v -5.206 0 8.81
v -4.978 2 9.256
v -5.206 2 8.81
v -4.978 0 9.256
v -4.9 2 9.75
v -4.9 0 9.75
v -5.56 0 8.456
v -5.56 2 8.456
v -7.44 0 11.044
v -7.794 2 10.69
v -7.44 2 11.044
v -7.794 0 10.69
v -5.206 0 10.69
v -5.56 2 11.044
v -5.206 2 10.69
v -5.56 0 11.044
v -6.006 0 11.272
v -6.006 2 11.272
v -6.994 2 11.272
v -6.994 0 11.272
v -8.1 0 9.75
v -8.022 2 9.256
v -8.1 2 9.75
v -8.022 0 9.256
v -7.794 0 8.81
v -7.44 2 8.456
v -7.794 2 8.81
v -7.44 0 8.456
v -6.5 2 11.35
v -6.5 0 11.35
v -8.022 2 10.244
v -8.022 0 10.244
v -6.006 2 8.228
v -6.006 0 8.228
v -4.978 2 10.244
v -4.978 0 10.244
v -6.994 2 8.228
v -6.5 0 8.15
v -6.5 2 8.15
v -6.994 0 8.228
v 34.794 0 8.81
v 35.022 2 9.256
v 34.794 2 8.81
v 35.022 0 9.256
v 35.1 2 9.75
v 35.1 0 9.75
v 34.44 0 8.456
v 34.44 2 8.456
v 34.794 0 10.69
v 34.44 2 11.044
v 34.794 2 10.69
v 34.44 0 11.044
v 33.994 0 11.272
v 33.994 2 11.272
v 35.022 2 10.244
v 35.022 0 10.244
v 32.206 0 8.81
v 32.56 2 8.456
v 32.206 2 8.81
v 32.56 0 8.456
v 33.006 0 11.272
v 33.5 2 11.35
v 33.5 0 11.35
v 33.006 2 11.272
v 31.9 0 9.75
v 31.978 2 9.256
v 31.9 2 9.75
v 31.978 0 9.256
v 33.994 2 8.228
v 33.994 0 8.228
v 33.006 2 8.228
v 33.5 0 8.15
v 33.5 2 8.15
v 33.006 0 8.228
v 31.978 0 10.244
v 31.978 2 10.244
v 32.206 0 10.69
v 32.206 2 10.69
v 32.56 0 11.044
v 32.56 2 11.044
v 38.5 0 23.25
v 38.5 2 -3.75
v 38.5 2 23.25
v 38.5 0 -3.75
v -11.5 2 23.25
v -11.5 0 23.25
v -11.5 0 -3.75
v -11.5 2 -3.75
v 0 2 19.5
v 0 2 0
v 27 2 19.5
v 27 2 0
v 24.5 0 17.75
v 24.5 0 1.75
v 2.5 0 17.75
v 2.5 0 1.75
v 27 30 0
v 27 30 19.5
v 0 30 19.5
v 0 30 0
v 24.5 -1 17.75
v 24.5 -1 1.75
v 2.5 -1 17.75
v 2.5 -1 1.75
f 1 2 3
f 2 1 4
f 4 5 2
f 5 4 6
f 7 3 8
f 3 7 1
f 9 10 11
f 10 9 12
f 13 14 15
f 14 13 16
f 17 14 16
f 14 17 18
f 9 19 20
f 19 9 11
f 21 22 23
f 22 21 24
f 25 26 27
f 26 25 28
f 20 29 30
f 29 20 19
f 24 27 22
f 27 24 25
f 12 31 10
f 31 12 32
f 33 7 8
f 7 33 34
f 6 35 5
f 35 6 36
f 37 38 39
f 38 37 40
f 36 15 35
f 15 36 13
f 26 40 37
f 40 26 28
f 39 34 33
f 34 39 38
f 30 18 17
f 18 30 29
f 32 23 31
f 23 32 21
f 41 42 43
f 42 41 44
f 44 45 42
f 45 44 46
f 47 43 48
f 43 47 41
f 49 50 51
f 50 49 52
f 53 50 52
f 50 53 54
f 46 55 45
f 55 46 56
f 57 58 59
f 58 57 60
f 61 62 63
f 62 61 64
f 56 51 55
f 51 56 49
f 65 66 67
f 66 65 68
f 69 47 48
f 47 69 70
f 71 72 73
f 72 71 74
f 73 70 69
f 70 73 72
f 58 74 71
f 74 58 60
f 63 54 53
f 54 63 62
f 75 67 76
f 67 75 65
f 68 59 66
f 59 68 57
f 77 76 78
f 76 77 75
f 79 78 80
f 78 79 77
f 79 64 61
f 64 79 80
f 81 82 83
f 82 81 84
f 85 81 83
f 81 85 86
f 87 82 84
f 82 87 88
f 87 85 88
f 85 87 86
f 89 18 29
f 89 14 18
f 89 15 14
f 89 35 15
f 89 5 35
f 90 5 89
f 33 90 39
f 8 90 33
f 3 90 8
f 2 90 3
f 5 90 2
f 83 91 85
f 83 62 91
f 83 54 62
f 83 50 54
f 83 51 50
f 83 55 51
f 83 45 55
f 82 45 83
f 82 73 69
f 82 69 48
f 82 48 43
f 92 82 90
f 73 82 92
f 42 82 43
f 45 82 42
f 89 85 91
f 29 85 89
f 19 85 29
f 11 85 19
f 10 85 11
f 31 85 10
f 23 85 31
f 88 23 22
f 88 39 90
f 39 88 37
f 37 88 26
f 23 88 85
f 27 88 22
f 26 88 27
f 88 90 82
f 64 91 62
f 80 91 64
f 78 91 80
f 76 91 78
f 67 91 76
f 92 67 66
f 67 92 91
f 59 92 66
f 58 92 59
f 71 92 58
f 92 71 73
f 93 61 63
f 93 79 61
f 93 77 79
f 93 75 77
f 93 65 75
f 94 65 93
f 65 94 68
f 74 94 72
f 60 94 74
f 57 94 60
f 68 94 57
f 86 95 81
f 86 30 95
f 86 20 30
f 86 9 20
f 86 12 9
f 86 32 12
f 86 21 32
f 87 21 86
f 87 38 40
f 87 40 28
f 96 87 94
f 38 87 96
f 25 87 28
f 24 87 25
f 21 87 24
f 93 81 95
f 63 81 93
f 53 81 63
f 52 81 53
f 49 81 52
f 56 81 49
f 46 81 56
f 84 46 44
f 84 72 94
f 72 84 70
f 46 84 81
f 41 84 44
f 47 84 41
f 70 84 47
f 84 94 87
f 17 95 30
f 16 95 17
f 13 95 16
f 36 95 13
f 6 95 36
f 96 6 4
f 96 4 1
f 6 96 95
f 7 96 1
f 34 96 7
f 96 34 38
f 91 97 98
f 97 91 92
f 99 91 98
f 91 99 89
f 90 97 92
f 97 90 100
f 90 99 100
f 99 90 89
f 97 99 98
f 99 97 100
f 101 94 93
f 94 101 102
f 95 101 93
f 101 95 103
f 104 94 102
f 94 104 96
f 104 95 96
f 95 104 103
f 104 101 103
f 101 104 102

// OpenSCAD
// IEC C14 Power Inlet Connector
// Standard PC power inlet for external power cord

module power_inlet_c14() {
    // C14 connector dimensions
    body_width = 27;
    body_height = 19.5;
    body_depth = 28;

    // Flange/mounting dimensions
    flange_width = 50;
    flange_height = 27;
    flange_thickness = 2;

    // Mount hole spacing
    mount_hole_spacing = 40;
    mount_hole_radius = 1.6;  // M3

    // Socket opening
    socket_width = 22;
    socket_height = 16;

    union() {
        // Mounting flange
        color("black") {
            difference() {
                translate([-flange_width/2 + body_width/2, 0, -flange_height/2 + body_height/2]) {
                    cube([flange_width, flange_thickness, flange_height]);
                }

                // Mount holes
                translate([body_width/2, -0.1, body_height/2]) {
                    translate([-mount_hole_spacing/2, 0, 0])
                        rotate([-90, 0, 0])
                            cylinder(h = flange_thickness + 0.2, r = mount_hole_radius, $fn = 20);
                    translate([mount_hole_spacing/2, 0, 0])
                        rotate([-90, 0, 0])
                            cylinder(h = flange_thickness + 0.2, r = mount_hole_radius, $fn = 20);
                }
            }
        }

        // Main body (behind panel)
        color("black") {
            translate([0, flange_thickness, 0]) {
                cube([body_width, body_depth, body_height]);
            }
        }

        // Socket opening indication
        color("dimgray") {
            translate([(body_width - socket_width)/2, -1, (body_height - socket_height)/2]) {
                cube([socket_width, 2, socket_height]);
            }
        }
    }
}

// Preview
power_inlet_c14();
